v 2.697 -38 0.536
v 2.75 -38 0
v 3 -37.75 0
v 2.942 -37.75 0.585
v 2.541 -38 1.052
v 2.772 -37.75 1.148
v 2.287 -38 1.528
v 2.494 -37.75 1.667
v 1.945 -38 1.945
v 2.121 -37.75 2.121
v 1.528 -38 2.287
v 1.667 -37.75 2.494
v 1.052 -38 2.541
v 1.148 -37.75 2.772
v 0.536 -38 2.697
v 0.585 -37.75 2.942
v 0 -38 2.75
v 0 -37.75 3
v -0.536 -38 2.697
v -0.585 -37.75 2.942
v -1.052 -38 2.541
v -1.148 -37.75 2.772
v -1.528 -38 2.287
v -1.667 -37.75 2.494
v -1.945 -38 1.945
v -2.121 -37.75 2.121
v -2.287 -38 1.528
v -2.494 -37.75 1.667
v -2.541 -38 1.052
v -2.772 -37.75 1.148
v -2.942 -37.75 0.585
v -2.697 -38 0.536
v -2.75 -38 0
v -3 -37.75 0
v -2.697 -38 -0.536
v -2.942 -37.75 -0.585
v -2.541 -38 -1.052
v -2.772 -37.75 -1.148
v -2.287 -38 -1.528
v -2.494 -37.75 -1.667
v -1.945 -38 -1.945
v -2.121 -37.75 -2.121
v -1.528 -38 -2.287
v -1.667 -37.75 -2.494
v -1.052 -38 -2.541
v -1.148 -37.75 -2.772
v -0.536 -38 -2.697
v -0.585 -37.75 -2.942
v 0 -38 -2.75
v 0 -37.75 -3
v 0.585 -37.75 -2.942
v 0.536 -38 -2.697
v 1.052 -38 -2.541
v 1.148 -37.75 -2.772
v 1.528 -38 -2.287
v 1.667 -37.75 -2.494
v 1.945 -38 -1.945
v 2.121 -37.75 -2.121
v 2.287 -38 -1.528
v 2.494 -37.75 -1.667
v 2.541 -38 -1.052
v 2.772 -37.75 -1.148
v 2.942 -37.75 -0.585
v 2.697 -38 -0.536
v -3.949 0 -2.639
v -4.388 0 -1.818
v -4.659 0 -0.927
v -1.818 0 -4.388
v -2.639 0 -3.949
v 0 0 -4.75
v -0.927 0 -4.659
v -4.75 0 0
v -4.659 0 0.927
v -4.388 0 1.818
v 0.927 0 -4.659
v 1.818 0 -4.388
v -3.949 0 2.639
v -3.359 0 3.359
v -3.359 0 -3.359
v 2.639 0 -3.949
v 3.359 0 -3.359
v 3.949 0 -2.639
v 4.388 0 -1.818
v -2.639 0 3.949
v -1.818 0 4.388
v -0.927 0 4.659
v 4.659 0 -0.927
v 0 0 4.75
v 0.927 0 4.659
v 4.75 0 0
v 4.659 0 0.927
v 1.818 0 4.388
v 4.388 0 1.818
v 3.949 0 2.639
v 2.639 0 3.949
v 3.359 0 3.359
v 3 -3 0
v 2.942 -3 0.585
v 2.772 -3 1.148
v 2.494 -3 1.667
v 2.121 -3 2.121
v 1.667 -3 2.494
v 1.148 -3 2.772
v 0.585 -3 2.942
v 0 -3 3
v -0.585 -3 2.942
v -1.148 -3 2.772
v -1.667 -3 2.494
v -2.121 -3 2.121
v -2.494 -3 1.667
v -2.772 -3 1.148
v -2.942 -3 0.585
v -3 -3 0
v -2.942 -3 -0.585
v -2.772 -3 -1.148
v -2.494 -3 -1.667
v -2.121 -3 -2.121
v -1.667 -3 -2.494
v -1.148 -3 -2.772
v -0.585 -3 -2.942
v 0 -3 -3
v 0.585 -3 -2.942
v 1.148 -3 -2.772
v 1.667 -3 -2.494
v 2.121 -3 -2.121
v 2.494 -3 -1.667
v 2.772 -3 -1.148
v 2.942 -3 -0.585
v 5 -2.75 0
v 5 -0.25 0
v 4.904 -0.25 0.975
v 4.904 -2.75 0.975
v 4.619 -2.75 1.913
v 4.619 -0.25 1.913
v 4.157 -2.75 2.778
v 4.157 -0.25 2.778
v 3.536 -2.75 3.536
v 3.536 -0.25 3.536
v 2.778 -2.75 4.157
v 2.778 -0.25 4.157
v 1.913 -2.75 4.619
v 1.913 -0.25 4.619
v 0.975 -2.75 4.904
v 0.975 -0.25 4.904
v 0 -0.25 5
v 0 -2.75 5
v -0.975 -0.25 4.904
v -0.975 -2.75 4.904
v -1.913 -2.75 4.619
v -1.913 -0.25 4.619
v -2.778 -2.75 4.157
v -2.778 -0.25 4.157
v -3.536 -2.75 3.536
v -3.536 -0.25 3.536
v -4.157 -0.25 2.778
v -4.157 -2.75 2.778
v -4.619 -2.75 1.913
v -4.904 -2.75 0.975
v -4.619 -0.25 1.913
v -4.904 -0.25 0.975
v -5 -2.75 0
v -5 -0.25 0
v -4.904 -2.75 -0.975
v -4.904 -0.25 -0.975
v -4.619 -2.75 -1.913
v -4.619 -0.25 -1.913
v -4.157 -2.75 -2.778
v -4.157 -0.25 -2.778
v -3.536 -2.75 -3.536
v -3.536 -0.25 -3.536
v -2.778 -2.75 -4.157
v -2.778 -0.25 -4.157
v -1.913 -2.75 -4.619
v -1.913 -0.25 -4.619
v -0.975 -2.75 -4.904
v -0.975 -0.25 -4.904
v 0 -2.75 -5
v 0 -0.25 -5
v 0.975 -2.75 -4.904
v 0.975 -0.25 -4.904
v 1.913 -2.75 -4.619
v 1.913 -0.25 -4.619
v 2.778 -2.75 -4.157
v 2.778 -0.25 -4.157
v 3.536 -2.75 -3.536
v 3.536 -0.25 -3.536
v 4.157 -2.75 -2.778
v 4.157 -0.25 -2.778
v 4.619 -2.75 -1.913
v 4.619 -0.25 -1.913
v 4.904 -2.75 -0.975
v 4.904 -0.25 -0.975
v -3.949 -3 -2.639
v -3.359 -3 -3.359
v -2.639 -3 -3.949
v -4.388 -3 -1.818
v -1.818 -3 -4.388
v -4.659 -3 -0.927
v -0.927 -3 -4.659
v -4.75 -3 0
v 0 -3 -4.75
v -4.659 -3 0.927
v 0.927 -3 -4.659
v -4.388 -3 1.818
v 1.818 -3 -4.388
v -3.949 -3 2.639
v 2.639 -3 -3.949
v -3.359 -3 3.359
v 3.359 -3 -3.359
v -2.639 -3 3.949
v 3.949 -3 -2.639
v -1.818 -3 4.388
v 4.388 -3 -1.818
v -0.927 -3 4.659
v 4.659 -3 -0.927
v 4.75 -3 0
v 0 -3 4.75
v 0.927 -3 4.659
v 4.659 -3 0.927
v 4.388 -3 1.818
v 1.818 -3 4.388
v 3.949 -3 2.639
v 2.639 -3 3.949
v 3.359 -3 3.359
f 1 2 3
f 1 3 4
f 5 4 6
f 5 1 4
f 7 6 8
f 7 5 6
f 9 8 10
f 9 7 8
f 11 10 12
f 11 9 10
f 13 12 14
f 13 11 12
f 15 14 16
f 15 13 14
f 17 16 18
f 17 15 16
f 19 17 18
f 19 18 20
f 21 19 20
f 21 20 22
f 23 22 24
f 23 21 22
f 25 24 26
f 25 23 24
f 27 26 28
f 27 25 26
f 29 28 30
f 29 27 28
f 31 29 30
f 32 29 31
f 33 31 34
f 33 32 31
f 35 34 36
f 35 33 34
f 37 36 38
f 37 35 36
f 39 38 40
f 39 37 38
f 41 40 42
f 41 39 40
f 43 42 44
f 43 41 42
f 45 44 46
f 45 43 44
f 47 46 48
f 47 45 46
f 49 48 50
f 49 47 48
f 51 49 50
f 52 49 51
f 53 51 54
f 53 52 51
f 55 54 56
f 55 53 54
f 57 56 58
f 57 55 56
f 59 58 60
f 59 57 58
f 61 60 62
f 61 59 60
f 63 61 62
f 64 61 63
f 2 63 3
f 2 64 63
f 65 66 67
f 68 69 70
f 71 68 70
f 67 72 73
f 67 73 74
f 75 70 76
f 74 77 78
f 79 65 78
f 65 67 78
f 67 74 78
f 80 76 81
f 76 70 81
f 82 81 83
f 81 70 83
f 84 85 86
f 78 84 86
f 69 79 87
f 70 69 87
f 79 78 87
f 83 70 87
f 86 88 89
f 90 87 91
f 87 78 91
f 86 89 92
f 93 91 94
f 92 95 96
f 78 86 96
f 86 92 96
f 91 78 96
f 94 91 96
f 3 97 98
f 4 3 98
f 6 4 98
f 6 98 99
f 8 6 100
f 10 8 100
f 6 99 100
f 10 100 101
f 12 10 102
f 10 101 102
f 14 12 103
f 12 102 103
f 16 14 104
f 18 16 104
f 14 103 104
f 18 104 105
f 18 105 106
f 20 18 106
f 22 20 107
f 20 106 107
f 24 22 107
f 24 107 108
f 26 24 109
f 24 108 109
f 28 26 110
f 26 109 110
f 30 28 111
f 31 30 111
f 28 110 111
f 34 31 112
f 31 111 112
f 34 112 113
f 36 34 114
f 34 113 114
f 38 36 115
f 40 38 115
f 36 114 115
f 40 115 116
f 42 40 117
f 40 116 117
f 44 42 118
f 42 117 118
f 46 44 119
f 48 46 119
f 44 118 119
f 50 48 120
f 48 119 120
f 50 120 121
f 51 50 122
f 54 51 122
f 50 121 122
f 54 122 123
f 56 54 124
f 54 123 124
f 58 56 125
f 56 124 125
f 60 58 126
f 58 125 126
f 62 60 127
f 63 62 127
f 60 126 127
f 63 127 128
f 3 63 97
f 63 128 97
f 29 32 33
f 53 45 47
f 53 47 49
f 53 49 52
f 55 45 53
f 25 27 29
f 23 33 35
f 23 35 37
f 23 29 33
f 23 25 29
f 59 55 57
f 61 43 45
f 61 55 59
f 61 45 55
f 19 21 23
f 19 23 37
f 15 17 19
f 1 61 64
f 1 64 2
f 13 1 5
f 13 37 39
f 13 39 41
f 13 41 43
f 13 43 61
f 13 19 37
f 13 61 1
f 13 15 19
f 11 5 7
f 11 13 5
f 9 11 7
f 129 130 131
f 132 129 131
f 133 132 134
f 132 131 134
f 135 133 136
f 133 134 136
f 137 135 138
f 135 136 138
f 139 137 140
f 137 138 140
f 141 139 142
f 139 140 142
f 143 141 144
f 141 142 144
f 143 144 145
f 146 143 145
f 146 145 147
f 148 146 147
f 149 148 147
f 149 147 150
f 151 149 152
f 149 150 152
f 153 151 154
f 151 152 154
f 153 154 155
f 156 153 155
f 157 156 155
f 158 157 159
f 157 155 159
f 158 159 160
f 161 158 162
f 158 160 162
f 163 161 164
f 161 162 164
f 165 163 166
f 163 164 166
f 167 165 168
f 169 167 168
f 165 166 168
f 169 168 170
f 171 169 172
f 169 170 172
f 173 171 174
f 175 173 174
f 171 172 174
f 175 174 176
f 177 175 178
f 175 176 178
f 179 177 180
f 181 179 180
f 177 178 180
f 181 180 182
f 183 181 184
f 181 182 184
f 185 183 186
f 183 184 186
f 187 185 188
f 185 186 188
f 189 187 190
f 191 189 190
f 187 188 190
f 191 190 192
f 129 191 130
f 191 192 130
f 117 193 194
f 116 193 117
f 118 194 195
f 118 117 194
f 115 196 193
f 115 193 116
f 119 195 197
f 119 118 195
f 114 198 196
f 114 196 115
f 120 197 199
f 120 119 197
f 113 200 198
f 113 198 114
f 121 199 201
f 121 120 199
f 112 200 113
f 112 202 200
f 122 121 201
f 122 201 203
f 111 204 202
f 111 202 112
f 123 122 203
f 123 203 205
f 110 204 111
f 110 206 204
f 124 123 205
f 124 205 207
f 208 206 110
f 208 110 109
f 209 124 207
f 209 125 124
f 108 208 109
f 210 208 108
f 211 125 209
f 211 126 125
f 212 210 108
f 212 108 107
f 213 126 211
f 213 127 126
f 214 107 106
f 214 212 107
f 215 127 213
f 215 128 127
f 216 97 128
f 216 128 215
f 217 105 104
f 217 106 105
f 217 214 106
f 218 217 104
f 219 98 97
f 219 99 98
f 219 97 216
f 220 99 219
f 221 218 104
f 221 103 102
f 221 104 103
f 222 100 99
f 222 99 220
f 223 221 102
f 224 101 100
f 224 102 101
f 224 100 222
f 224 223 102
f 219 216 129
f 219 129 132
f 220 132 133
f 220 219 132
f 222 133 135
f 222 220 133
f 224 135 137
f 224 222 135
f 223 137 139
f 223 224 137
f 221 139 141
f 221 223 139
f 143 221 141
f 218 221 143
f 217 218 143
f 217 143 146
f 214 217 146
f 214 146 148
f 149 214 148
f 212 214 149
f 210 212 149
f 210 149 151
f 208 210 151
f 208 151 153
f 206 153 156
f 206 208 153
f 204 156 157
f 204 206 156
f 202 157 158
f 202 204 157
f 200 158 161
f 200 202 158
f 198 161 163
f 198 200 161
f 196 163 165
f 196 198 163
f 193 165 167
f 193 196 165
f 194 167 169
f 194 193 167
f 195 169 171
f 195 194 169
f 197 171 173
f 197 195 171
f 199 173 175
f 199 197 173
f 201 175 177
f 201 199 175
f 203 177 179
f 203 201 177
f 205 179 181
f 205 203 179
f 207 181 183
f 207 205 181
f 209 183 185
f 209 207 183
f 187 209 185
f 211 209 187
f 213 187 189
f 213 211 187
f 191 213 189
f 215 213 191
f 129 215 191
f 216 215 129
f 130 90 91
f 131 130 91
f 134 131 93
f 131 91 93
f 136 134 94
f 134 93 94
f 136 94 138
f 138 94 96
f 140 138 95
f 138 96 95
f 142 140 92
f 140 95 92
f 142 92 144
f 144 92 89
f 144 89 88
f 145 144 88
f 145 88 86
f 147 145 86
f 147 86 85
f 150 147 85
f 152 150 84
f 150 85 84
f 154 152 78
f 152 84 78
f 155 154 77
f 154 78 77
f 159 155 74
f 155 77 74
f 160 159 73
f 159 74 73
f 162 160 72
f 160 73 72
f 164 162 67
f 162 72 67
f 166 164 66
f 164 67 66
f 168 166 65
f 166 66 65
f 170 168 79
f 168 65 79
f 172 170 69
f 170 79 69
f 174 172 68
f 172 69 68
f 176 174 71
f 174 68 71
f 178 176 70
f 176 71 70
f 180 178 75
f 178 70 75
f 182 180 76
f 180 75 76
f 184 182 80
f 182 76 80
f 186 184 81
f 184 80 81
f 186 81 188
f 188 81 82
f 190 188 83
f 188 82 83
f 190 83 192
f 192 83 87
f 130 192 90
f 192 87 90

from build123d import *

# Parameters (mm, degrees)
F0_R     = 5
F1_DEPTH = 3
F2_R     = 3
F3_DEPTH = 35
F4_SIZE  = 0.25


with BuildPart() as f1:
    # F0 (on Front) → F1 (new body)
    with BuildSketch(Plane.XZ):
        Circle(F0_R)
    extrude(amount=F1_DEPTH)

    # F2 (on face) → F3 (join)
    with BuildSketch(Plane.XZ.offset(3)):
        Circle(F2_R)
    extrude(amount=F3_DEPTH)

    # F4
    f4_edges = [f1.edges().sort_by_distance(p)[0] for p in [
        (-5, 0, 0),
        (-5, -3, 0),
        (-3, -38, 0),
    ]]
    chamfer(f4_edges, length=F4_SIZE)


solid = f1.part
